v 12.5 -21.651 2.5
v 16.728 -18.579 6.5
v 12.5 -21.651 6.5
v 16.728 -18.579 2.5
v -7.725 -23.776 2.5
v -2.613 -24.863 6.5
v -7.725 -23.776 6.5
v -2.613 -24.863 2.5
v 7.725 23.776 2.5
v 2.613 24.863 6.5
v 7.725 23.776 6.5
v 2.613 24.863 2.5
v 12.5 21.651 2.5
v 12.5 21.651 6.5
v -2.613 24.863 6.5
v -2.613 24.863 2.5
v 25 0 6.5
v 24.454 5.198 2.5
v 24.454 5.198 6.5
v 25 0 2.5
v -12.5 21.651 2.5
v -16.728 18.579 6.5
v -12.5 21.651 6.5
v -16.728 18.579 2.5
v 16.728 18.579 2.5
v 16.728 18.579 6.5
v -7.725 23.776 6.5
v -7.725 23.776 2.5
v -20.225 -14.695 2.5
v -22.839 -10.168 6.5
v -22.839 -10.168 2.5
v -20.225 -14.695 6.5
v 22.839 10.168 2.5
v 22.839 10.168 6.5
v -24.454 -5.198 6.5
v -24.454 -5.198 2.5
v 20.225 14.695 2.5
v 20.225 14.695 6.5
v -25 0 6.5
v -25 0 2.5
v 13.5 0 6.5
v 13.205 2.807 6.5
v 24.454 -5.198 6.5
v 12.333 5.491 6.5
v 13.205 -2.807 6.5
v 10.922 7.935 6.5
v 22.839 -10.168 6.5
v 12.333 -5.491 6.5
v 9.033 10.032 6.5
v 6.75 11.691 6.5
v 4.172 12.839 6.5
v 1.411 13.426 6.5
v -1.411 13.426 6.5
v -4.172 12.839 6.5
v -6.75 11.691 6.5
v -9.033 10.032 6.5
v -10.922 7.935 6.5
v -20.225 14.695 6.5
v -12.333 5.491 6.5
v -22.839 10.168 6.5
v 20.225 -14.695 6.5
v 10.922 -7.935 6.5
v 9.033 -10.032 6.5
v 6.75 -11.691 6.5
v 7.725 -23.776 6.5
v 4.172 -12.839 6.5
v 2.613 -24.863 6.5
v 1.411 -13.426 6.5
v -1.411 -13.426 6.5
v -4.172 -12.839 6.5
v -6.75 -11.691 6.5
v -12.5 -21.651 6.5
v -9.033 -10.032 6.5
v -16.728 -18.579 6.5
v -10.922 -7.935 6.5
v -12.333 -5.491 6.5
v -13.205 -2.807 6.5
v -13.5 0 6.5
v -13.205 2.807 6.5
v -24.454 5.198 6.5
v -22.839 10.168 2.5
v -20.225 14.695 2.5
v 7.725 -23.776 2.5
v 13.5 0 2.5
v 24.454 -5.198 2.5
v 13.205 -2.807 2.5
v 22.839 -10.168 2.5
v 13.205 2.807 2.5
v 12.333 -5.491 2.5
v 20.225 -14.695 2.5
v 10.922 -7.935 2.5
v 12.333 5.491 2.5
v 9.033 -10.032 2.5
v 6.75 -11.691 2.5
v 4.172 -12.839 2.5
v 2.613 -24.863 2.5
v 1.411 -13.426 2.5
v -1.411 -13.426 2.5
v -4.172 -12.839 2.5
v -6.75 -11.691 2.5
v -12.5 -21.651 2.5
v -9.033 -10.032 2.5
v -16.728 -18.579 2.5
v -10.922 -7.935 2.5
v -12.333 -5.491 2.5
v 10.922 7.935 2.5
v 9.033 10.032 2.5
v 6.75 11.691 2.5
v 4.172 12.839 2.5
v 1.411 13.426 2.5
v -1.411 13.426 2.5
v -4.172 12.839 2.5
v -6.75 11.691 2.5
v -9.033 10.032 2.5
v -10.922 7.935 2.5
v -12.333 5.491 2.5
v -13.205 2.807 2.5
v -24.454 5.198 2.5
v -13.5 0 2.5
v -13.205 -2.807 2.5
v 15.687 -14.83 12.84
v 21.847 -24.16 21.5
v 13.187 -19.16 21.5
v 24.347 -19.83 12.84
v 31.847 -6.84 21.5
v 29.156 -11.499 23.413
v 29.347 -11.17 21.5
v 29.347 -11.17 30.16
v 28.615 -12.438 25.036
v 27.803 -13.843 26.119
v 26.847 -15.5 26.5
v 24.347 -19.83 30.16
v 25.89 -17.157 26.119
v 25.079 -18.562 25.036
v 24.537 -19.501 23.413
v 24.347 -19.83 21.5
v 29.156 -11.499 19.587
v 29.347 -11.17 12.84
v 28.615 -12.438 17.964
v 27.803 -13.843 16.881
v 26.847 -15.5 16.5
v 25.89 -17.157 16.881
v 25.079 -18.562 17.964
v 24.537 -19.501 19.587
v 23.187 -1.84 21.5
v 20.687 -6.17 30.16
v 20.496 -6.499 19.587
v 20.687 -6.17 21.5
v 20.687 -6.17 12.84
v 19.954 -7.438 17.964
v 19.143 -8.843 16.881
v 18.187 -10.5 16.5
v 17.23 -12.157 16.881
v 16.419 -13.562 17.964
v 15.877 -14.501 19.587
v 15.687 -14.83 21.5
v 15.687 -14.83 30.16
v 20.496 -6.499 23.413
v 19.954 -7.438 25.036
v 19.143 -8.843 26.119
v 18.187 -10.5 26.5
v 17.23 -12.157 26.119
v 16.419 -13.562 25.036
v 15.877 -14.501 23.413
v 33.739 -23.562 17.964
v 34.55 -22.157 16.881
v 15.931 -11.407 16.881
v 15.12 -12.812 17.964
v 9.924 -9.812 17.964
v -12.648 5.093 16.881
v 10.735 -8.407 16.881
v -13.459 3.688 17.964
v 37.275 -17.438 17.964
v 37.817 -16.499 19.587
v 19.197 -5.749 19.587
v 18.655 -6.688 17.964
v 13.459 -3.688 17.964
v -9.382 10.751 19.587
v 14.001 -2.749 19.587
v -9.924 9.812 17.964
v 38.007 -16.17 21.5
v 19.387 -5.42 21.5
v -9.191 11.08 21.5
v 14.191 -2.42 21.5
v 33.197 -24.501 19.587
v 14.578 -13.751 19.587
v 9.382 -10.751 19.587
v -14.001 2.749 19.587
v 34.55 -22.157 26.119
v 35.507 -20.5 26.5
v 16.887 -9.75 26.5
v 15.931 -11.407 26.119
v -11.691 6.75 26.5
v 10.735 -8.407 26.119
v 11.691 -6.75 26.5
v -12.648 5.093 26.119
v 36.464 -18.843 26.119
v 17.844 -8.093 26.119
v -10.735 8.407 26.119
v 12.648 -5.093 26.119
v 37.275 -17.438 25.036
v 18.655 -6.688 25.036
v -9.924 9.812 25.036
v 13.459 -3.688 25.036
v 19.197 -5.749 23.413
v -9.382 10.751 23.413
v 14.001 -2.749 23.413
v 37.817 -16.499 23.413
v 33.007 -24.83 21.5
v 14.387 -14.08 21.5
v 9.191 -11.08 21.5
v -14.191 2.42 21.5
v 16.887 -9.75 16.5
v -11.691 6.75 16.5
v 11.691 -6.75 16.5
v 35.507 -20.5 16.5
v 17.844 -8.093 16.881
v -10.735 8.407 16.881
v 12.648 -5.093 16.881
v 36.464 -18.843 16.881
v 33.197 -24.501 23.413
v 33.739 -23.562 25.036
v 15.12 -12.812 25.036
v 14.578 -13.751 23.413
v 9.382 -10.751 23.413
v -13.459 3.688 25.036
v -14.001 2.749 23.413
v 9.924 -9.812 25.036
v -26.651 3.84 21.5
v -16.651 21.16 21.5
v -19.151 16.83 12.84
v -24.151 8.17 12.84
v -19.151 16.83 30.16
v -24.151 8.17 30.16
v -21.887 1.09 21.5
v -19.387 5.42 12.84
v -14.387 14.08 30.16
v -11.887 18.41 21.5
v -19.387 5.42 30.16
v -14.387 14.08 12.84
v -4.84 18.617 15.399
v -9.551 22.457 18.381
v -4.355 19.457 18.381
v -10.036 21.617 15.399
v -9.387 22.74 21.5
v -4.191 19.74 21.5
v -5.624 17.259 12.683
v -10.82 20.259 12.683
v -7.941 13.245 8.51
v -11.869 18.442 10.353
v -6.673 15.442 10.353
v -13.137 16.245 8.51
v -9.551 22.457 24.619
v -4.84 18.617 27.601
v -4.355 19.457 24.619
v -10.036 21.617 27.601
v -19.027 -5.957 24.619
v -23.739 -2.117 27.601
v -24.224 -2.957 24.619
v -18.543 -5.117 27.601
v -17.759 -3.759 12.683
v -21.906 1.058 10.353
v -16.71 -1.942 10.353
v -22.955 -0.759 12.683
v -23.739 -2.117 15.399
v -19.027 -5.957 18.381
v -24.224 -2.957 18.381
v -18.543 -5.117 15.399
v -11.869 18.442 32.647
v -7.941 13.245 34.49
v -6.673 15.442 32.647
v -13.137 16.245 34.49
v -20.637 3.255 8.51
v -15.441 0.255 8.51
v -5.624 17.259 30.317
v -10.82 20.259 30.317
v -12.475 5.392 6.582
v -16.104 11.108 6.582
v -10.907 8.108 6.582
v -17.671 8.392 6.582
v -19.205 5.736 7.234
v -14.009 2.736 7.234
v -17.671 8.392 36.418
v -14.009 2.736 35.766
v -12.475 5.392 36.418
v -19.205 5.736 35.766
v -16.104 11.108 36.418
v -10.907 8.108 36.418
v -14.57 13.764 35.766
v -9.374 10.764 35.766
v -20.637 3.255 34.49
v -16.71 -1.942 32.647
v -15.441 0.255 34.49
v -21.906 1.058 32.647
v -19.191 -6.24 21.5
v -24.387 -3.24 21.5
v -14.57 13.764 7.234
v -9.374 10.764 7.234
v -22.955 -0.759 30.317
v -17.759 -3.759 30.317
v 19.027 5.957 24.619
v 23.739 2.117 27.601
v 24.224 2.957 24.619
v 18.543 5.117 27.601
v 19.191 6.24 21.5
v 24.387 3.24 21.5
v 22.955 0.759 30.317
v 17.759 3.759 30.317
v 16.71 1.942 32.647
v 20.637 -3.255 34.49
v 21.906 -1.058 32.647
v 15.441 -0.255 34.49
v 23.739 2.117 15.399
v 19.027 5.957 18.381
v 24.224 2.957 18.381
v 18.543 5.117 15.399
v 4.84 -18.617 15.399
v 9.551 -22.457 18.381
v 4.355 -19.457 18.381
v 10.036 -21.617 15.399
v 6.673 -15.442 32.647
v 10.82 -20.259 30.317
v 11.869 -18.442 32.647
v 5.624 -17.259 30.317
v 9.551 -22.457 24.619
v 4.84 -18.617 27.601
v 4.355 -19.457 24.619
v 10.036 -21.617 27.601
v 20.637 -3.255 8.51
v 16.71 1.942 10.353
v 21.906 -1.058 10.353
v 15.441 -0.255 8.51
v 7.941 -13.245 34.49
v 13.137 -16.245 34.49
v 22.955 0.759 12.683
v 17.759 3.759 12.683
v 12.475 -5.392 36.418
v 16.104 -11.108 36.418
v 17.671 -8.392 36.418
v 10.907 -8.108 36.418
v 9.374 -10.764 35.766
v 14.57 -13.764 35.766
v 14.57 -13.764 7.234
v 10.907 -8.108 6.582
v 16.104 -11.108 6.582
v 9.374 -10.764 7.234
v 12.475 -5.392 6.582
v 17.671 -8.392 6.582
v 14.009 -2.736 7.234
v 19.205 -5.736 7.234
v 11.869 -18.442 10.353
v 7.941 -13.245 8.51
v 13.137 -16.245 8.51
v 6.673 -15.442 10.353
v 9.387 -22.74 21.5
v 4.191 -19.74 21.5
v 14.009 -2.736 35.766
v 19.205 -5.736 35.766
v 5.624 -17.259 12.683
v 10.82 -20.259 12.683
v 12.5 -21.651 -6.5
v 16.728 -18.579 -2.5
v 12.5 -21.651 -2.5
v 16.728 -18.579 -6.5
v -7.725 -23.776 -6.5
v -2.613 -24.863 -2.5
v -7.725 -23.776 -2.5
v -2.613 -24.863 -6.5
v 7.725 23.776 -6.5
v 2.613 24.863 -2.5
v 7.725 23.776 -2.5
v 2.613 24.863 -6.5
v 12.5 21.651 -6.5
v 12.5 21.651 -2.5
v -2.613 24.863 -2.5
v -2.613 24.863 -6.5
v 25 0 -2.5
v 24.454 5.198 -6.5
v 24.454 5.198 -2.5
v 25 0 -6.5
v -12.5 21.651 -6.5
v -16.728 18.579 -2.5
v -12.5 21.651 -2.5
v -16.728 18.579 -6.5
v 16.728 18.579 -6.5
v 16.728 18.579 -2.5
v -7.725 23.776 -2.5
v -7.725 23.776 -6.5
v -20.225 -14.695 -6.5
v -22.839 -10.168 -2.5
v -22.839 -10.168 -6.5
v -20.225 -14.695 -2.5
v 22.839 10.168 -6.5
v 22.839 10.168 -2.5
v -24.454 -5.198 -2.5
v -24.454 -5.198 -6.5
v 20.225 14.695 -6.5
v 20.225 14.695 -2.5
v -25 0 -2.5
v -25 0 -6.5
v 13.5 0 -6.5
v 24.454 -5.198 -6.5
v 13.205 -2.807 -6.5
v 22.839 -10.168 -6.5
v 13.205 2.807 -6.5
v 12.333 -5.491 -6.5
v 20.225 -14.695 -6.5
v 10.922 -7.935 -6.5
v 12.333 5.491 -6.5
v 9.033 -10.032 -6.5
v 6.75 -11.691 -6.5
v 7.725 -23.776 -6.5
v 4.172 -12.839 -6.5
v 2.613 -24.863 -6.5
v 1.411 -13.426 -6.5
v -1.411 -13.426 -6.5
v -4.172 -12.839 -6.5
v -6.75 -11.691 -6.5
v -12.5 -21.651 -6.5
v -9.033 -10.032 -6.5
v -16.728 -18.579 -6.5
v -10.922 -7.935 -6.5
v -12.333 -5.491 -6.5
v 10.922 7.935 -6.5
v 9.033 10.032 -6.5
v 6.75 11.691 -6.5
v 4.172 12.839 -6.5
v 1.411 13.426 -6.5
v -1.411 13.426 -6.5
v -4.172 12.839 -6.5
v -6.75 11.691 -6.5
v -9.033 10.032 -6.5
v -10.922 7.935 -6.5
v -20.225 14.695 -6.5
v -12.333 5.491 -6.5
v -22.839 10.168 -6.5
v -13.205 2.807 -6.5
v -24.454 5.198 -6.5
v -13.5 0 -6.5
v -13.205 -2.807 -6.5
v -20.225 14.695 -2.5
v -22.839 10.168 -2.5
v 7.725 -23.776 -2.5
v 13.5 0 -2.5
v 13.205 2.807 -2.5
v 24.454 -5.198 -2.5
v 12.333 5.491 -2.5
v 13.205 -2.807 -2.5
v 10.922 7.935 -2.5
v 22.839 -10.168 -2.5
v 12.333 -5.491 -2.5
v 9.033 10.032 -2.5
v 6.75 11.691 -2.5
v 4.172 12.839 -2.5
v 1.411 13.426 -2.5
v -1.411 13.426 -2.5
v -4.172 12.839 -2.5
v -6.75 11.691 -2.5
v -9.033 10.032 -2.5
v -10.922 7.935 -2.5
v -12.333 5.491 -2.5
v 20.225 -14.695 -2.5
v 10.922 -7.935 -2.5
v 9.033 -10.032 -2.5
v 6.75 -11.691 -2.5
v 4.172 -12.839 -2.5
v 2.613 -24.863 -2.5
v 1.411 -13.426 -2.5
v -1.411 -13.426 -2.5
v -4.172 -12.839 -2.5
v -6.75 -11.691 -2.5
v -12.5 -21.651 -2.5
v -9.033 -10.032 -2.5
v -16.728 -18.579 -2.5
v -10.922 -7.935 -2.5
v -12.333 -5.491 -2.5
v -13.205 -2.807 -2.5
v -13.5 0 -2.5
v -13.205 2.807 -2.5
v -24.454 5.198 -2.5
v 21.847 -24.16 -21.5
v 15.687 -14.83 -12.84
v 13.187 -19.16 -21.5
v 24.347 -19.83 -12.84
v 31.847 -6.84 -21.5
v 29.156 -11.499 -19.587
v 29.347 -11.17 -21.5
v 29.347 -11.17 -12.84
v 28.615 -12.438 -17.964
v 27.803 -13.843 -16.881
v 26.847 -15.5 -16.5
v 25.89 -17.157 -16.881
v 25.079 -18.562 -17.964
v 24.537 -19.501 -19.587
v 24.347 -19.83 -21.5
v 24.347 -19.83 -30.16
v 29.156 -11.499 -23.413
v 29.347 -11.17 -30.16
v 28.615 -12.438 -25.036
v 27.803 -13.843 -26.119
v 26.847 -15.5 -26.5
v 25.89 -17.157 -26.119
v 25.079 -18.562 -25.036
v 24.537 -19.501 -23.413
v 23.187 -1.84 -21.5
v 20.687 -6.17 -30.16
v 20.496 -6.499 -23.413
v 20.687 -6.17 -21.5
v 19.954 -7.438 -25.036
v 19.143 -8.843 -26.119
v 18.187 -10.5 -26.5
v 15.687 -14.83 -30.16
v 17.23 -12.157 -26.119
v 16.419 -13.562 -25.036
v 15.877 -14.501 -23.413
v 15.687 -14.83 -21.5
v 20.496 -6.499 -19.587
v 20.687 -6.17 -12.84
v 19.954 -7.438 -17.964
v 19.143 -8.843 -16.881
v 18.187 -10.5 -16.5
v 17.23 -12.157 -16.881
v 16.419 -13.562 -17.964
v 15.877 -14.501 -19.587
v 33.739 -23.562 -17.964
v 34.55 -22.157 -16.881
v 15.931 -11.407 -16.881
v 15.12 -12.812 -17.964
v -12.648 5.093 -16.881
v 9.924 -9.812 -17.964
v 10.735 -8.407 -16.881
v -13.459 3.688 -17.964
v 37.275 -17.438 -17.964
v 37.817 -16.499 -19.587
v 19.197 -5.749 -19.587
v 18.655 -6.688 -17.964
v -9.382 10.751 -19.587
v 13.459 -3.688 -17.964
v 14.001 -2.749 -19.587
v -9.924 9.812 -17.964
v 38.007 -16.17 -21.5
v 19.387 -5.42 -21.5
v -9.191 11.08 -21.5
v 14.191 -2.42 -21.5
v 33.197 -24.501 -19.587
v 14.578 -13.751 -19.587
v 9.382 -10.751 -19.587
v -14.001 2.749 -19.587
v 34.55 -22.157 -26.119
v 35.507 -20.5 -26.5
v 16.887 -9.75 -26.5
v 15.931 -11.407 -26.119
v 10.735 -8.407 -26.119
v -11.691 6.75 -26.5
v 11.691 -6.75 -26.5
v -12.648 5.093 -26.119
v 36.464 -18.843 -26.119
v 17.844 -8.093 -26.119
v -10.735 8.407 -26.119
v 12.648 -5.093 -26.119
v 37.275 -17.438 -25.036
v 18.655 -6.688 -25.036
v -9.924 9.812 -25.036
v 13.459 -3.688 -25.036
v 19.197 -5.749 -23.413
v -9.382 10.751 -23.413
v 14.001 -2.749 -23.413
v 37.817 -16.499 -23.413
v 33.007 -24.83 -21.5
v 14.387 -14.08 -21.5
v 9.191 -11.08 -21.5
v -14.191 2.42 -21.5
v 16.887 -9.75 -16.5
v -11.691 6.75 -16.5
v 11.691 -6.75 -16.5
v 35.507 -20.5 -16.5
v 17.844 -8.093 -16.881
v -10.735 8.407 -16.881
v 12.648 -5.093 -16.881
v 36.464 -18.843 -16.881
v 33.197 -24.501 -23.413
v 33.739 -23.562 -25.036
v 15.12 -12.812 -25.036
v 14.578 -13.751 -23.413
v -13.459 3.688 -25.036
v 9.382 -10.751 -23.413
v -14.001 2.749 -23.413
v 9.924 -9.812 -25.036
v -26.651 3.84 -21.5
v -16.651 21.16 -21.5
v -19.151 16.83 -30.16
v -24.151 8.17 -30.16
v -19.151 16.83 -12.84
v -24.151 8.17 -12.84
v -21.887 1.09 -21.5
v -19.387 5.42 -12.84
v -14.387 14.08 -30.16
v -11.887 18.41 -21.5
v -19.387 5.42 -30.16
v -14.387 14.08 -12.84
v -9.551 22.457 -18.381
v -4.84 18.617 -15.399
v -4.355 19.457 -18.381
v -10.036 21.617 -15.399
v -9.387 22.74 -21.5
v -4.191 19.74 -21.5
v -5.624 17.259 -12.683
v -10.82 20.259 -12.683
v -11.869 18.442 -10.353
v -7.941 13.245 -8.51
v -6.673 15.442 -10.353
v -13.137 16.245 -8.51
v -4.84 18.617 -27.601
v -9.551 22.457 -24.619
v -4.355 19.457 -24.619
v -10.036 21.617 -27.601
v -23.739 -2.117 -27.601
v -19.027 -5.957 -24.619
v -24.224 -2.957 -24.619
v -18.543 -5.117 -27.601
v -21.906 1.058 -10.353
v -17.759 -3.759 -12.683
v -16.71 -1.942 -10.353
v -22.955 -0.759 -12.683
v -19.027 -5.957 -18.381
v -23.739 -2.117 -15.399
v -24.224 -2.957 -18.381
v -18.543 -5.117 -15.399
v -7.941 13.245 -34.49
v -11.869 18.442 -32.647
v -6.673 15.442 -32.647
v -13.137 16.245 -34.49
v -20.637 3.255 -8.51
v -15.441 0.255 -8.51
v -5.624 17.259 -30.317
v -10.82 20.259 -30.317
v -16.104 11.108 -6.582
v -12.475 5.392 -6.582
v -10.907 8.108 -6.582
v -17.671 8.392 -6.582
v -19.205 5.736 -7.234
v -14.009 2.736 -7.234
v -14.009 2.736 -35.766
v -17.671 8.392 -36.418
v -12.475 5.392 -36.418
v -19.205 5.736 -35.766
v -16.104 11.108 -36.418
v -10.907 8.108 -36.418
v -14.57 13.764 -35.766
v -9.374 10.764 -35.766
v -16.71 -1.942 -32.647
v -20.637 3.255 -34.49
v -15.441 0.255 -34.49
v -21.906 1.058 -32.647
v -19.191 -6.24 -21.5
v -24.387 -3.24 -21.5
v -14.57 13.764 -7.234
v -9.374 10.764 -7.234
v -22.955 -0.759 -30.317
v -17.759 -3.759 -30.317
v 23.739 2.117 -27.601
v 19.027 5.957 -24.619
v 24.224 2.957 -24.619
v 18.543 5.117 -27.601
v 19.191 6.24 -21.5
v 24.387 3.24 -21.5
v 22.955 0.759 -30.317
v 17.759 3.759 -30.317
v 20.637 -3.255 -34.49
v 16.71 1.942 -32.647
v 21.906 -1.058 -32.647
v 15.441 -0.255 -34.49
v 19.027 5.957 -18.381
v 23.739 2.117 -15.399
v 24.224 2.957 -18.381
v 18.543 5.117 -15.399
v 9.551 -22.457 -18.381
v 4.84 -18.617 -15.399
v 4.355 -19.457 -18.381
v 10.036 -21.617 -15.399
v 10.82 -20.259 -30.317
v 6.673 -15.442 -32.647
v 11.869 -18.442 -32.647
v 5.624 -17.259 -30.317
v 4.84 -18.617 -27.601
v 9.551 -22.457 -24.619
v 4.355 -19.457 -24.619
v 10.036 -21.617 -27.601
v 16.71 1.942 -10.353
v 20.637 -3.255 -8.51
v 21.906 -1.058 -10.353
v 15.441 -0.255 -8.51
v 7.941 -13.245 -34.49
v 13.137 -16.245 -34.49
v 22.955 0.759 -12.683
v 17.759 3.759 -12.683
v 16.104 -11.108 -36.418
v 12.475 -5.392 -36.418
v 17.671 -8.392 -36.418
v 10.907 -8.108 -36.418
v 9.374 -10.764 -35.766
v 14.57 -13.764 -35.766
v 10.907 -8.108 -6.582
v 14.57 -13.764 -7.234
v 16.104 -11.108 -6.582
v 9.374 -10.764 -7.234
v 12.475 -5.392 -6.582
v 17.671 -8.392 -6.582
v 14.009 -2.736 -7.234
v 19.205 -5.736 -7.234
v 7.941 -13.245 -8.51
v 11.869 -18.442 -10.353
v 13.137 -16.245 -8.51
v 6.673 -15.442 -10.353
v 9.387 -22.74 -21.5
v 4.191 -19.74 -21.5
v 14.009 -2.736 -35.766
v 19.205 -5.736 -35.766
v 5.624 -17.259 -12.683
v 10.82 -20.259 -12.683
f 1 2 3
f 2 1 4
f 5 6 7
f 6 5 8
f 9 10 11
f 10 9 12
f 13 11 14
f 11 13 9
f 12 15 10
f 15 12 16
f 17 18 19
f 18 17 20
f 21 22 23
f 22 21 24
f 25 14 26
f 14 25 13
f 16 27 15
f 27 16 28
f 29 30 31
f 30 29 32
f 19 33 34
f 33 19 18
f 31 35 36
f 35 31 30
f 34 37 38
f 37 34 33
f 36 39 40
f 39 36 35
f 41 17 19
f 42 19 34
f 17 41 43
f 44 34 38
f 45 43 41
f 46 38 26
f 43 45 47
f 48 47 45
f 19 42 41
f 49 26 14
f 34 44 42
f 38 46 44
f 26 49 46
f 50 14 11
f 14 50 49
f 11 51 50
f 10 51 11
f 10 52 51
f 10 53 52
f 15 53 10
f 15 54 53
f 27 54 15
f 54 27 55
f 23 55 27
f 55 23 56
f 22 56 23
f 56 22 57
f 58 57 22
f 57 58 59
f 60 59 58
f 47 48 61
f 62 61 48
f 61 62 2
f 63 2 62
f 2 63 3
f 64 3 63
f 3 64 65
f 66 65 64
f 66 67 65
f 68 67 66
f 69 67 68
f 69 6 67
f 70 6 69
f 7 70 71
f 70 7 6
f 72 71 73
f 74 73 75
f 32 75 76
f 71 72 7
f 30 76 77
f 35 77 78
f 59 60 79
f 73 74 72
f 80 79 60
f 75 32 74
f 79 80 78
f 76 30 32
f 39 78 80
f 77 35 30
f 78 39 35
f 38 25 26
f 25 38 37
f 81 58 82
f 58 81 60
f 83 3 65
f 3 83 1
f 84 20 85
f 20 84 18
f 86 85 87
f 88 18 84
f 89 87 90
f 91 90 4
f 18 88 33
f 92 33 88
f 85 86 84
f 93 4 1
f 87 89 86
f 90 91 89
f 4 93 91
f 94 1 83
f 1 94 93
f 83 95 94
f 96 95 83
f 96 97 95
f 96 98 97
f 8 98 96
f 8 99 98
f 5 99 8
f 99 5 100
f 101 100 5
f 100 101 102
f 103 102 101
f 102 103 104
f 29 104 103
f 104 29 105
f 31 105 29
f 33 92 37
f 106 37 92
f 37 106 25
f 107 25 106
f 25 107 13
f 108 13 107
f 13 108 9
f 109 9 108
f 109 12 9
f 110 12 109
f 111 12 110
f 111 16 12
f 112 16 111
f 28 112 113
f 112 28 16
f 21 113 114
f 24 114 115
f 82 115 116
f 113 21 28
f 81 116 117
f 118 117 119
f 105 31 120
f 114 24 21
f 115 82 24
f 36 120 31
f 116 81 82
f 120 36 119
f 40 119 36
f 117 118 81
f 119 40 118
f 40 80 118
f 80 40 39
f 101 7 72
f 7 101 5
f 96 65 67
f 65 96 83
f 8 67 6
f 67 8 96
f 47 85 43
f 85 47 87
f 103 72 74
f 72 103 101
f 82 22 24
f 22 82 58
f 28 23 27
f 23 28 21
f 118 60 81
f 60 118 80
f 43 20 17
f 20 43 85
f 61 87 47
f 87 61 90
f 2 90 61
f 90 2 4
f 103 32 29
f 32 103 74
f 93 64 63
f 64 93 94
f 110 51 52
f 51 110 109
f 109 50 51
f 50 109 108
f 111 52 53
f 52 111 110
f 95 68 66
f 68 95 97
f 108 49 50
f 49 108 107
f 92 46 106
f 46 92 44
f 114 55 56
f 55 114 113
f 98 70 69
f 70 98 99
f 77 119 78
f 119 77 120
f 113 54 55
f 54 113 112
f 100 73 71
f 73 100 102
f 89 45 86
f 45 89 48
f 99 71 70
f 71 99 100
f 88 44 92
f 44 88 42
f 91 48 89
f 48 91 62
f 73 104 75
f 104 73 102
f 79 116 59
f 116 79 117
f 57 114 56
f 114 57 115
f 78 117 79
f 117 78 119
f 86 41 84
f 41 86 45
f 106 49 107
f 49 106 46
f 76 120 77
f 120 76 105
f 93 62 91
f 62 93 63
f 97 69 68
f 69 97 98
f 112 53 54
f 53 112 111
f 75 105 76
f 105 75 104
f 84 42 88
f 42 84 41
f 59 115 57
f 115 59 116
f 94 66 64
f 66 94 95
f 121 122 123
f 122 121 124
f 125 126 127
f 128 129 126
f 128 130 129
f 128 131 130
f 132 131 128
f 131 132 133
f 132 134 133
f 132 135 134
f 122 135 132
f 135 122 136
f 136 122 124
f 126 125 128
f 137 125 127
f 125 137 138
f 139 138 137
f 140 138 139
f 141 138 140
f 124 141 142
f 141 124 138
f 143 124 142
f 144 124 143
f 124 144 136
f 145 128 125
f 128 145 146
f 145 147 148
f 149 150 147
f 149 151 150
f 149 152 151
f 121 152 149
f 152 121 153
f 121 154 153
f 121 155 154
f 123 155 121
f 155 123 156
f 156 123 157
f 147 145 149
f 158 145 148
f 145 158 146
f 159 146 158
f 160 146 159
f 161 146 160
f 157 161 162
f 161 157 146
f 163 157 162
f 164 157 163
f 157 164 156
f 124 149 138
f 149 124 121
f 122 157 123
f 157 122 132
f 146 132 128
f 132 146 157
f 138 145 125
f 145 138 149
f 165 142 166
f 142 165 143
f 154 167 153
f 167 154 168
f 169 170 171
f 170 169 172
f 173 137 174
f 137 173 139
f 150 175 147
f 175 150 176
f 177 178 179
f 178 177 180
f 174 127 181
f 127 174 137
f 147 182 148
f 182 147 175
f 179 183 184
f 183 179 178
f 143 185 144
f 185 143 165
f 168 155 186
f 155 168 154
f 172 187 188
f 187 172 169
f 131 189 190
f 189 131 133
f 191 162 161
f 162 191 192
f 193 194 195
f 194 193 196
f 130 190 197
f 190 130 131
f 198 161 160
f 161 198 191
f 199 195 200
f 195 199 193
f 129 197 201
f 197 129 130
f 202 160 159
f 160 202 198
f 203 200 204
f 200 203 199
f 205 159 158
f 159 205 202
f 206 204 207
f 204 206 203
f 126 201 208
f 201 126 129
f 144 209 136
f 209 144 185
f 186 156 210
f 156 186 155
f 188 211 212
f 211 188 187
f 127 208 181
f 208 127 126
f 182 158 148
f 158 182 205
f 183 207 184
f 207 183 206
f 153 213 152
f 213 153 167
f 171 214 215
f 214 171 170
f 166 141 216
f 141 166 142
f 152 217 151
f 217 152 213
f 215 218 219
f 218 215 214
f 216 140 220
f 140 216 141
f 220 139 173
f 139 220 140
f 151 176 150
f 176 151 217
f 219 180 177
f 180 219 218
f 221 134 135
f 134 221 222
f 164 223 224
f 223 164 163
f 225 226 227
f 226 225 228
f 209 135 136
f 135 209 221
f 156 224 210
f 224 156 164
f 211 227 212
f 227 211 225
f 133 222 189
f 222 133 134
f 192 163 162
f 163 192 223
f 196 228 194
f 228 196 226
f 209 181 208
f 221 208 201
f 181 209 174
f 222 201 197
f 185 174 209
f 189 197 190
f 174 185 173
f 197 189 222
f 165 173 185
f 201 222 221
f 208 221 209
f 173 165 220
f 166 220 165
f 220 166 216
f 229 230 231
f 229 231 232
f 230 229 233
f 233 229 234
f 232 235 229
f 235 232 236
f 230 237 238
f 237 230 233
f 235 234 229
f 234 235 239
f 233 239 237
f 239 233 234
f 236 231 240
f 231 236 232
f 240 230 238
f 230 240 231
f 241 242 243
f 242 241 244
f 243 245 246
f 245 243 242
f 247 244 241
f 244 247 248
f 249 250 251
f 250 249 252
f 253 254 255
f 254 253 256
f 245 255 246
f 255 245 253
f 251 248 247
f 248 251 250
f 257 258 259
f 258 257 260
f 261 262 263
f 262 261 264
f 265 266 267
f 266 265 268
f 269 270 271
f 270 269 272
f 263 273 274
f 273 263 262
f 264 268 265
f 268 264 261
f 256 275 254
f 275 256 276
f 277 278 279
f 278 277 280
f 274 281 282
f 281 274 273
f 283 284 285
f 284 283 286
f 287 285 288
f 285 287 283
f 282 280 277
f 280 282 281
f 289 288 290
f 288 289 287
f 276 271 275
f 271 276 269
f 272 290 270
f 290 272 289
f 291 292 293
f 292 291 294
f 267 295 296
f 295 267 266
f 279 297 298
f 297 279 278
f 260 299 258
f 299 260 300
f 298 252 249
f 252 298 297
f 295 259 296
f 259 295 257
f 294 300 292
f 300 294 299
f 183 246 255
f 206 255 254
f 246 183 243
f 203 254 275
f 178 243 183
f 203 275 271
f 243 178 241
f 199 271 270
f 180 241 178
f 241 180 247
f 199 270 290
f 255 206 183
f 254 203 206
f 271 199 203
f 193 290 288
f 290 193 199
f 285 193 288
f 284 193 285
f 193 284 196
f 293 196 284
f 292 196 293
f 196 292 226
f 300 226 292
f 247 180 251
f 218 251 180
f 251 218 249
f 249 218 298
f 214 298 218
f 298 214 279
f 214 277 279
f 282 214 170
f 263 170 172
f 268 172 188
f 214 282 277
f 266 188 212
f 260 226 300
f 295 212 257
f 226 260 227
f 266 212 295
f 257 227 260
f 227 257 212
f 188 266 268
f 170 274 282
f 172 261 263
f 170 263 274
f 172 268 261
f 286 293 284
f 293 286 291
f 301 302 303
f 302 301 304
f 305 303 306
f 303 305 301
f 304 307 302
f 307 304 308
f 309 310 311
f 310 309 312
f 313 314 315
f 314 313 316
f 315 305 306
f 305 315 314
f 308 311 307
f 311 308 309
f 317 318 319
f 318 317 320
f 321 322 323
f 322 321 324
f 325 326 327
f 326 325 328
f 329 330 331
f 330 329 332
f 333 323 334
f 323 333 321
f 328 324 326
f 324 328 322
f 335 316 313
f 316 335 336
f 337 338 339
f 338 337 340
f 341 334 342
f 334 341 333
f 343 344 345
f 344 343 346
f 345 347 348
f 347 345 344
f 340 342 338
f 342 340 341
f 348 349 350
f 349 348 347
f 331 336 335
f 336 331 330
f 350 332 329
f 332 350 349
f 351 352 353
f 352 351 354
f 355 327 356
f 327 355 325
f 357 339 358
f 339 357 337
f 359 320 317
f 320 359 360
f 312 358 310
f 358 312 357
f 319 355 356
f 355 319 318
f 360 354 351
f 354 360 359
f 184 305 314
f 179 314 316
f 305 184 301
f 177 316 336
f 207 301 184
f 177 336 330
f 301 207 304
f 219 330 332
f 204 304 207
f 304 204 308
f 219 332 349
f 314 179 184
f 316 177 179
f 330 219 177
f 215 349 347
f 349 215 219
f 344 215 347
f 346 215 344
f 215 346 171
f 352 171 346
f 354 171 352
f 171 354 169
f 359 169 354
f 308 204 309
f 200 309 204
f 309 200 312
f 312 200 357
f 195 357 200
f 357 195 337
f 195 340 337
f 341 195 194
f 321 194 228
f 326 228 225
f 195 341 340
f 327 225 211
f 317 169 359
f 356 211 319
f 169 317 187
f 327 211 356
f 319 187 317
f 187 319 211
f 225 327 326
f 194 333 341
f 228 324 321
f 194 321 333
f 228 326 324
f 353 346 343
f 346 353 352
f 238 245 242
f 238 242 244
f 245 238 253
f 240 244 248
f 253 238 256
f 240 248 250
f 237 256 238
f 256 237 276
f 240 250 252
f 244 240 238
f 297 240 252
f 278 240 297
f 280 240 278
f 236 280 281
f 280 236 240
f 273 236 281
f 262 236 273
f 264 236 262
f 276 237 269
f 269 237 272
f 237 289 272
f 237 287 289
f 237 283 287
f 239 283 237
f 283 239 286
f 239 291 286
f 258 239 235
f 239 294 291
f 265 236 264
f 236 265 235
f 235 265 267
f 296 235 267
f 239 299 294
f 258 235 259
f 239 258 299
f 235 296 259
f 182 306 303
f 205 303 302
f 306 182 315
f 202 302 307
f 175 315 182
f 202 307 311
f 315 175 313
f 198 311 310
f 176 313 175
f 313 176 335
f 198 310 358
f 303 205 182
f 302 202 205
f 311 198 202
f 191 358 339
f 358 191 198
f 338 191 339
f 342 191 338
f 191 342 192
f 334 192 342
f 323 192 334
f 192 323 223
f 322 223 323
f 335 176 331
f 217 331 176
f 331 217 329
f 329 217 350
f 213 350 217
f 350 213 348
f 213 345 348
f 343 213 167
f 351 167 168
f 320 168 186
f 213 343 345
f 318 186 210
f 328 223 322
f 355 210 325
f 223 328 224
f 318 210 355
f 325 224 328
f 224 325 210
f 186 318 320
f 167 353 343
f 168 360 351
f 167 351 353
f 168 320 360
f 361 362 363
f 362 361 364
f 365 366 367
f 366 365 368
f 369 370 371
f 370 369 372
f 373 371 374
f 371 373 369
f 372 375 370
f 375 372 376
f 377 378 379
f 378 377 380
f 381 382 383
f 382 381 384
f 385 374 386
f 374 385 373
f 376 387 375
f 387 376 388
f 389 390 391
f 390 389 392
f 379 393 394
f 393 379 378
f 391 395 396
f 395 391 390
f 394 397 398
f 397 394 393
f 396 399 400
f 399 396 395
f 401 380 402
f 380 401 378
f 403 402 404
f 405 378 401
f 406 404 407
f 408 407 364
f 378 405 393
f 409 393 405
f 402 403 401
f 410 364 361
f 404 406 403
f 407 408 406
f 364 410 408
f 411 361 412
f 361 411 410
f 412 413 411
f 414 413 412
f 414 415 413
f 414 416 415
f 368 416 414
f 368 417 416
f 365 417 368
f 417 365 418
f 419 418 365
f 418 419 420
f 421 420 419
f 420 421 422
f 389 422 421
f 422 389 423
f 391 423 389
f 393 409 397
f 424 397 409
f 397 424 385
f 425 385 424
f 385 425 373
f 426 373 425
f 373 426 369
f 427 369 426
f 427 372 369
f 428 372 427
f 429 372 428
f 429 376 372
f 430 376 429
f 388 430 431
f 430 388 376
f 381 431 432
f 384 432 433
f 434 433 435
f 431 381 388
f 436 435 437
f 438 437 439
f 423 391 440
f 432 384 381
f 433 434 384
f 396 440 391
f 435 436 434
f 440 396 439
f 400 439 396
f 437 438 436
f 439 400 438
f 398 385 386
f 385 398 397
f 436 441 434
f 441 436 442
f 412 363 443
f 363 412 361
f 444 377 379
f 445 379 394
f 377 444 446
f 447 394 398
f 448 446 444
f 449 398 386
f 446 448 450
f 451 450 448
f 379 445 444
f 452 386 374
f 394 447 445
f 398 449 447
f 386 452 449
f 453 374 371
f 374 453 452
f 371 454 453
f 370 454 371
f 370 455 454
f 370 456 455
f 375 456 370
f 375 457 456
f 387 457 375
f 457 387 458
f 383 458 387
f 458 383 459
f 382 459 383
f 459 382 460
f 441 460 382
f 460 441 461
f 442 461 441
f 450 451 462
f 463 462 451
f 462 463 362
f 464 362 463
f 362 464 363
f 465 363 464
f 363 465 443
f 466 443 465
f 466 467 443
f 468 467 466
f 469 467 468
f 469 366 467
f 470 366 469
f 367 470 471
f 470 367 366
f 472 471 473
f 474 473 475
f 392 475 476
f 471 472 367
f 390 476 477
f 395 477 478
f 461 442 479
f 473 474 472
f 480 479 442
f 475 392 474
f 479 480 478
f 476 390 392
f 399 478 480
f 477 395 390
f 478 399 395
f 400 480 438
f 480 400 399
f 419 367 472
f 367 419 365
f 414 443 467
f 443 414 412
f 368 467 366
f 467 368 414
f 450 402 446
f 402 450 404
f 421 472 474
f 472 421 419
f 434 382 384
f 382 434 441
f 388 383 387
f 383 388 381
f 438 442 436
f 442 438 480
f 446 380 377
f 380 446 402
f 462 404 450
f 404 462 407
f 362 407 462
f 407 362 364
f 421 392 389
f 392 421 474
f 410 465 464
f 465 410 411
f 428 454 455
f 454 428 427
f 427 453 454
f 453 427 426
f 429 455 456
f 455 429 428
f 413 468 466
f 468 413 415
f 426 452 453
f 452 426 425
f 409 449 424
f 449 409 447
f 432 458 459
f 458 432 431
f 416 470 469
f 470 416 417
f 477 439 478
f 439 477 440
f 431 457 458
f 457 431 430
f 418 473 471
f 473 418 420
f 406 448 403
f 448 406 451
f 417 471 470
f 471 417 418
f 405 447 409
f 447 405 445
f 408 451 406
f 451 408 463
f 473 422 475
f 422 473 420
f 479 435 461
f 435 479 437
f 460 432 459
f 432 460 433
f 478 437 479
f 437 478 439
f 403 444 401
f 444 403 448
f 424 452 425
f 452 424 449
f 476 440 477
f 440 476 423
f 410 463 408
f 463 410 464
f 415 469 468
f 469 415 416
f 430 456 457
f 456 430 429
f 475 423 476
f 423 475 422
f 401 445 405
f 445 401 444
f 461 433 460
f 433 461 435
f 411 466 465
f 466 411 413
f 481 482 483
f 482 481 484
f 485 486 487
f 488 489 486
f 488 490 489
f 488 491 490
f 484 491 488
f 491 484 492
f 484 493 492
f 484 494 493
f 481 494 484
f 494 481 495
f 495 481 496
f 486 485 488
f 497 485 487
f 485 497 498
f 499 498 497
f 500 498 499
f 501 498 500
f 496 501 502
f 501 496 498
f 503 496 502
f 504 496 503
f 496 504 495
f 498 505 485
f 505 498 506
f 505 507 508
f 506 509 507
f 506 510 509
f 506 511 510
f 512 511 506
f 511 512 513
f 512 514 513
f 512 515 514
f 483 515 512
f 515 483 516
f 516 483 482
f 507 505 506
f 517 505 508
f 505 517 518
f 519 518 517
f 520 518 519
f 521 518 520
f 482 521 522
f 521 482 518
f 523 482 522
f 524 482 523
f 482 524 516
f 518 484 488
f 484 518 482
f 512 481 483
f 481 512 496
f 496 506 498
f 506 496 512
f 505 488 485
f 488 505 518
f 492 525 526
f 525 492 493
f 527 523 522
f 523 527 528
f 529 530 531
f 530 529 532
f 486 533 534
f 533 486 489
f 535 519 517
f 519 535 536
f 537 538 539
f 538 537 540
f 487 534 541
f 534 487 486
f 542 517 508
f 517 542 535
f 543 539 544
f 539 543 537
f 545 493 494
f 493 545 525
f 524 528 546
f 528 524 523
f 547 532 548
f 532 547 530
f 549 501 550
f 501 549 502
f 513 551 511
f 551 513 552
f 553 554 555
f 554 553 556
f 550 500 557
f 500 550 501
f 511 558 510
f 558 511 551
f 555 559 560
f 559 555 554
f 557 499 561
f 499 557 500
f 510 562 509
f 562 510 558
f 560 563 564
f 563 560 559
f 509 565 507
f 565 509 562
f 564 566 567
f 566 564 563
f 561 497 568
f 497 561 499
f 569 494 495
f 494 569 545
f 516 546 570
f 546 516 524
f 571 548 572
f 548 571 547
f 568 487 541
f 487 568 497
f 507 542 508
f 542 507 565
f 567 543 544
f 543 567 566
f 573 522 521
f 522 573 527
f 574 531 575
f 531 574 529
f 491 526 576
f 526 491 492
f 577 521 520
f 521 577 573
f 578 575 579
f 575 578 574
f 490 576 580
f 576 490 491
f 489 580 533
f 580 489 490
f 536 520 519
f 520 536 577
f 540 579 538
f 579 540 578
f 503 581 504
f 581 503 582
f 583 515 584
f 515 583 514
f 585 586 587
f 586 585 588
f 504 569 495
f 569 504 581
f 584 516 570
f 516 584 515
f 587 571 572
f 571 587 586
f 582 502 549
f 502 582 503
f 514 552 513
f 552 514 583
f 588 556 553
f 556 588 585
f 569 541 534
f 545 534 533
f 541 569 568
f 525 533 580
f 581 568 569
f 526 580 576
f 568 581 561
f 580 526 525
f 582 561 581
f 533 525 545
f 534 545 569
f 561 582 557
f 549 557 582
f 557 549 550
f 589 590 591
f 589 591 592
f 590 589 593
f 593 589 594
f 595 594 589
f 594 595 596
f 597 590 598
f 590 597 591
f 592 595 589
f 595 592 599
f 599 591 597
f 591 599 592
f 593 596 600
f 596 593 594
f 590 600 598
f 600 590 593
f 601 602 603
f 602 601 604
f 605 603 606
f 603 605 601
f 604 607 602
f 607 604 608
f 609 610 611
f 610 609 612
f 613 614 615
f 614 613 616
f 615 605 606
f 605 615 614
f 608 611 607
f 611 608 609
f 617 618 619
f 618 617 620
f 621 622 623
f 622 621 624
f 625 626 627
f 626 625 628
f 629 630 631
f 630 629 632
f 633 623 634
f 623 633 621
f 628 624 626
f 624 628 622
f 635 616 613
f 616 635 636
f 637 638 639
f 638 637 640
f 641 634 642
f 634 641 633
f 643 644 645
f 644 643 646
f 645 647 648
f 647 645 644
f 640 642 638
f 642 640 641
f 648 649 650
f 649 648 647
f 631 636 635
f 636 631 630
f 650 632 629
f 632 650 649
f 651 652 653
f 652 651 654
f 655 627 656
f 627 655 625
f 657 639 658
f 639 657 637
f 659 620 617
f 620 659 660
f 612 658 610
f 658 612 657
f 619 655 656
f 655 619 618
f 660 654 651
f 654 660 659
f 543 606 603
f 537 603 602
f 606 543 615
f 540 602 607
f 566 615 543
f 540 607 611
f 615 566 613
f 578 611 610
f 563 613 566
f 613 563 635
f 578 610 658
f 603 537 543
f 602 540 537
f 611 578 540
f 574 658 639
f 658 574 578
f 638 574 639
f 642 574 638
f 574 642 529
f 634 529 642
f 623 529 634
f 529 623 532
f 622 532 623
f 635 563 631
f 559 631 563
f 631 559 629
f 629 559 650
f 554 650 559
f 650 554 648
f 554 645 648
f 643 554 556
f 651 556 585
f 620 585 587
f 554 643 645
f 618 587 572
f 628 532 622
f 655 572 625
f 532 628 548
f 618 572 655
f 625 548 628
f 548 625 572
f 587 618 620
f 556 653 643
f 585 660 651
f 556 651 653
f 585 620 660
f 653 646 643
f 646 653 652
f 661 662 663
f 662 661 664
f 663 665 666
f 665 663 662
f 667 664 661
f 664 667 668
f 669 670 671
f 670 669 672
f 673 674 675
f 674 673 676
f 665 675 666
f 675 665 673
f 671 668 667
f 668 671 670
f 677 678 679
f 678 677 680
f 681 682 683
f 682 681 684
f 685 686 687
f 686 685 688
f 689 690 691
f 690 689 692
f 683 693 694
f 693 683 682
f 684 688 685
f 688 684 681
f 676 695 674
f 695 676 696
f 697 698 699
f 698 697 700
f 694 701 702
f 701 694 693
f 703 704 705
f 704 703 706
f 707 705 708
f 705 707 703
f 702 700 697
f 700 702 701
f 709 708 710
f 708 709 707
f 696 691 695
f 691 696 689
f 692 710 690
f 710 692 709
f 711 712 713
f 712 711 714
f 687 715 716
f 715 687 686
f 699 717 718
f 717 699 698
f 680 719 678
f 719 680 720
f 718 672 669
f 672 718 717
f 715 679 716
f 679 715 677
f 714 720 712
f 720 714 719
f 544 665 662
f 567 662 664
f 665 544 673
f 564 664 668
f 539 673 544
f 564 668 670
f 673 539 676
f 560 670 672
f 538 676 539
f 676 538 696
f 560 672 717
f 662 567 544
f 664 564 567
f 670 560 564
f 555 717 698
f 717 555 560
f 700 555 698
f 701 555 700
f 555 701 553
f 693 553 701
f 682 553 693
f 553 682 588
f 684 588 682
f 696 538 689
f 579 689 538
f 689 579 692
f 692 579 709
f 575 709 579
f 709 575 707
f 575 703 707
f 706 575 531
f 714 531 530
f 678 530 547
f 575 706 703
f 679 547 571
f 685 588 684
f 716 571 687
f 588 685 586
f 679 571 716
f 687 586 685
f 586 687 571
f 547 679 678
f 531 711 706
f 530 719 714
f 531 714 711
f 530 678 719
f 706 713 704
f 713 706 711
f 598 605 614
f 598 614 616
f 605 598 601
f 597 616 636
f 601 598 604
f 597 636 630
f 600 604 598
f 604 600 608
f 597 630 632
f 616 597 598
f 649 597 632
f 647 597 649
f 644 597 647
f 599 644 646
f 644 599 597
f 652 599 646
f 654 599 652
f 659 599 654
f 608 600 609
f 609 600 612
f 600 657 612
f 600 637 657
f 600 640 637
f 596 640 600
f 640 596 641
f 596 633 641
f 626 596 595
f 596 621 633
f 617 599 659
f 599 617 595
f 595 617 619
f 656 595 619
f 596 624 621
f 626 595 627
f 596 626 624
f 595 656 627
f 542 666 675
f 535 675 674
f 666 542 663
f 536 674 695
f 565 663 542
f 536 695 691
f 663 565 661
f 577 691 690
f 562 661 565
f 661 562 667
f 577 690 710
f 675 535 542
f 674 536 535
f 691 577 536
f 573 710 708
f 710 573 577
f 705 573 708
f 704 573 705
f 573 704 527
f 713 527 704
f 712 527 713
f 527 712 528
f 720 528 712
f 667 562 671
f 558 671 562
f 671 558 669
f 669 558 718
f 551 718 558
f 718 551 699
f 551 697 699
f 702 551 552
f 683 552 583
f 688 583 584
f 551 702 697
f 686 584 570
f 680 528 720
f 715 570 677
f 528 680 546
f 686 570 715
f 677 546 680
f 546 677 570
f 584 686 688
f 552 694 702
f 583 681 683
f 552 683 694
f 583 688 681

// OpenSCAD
// file: ../common/metric_nut.scad
// include <../../config.scad>;
use <./beam_hexagonal.scad>;
use <./metric_bolt_functions.scad>;

module metric_nut(size, centre = true) {
    height = get_metric_bolt_head_height(size);
    diameter = get_metric_bolt_head_diameter(size);
    radius = diameter / 2;
    color("gray") difference() {
        // body
        beam_hexagonal(height, diameter, centre = centre, suppress_shopping_outputs = true);
        // hole
        cylinder(height, size / 2, size / 2, center = centre);
    }
    // Shopping
    echo(str("Nut: Nut M", size, " - x1"));
}

// $fn = 200;
metric_nut(12);
// file: ../common/beam_hexagonal.scad
// include <../../config.scad>;

module beam_hexagonal(L, d, centre = true, suppress_shopping_outputs = false) {
    radius = d / 2;
    linear_extrude(L, center = centre) polygon([[radius, 0], [radius * cos(60), radius * sin(60)], [radius * cos(120), radius * sin(120)], [radius * cos(180), radius * sin(180)], [radius * cos(240), radius * sin(240)], [radius * cos(300), radius * sin(300)]]);
    // Shopping
    if (!suppress_shopping_outputs) {
        echo(str("Hexagonal beam: Hexagonal beam Φ", d, "mm x ", L, "mm - x1"));
    }
}

// $fn = 200;
beam_hexagonal(500, 50);
// file: ../fixings/tube_clamp_square_base_plate_132_functions.scad
function get_L_shaft_with_base_plate_square_base_plate_132(beam_width) = 
    // (beam_width == 40) ?
    75
;
function get_R_plate_square_base_plate_132(beam_width) = 
    // (beam_width == 40) ?
    [143, 75, 18.5]
;
function get_thickness_square_base_plate_132(beam_width) = 
    // (beam_width == 40) ?
    8
;
function get_offset_hole_x_square_base_plate_132(beam_width) = 
    // (beam_width == 40) ?
    100 / 2
;
function get_diameter_hole_square_base_plate_132(beam_width) = 
    // (beam_width == 40) ?
    10
;
// file: ../fixings/tube_clamp_round_base_plate_132_functions.scad
function get_L_shaft_with_base_plate_round_base_plate_132(tube_diameter) = 
    (tube_diameter == 27) ? 
        85
    : (tube_diameter == 42) ?
        122
    : 25
;
function get_R_plate_round_base_plate_132(tube_diameter) = 
    (tube_diameter == 27) ? 
        [64, 114, 7]
    : (tube_diameter == 42) ?
        [80, 140, 10]
    : [10, 20, 1]
;
function get_offset_hole_y_round_base_plate_132(tube_diameter) = 
    (tube_diameter == 27) ? 
        38
    : (tube_diameter == 42) ?
        50
    : 10
;
function get_diameter_hole_round_base_plate_132(tube_diameter) = 10;
// file: ../fixings/tube_clamp_round_3_way_through_116_functions.scad
function  get_L_shaft_long_round_3_way_through_116(tube_diameter) = 
    (tube_diameter == 27) ? 
        42
    : (tube_diameter == 42) ?
        60
    : 25
;
function get_thickness_round_3_way_through_116(tube_diameter) = 7;
function get_L_shaft_short_round_3_way_through_116(tube_diameter) = tube_diameter + 2 * get_thickness_round_3_way_through_116();
// file: ../fixings/tube_clamp_round_tee_long_104_functions.scad
// include <../../config.scad>;

function get_L_shaft_long_round_tee_long_104(tube_diameter) = 
    (tube_diameter == 27) ? 
        85
    : (tube_diameter == 42) ?
        122
    : 25
;
function get_L_shaft_short_round_tee_long_104(tube_diameter) = 
    (tube_diameter == 27) ? 
        42
    : (tube_diameter == 42) ?
        61
    : 10
;
// file: brake_assembly_functions.scad
// include <../../config.scad>; // circular reference!

function get_y_pos_lead_fixing_ballscrew_to_brake_arms(angle_brake_rod, y_pos_axle_rear, x_pos_axle_leg_rear, x_offset_fixing_brake_arm_to_lead_plate) = y_pos_axle_rear + (x_pos_axle_leg_rear - x_offset_fixing_brake_arm_to_lead_plate) / tan(angle_brake_rod); // (X_POS_AXLE_LEG_REAR - X_OFFSET_FIXING_BRAKE_ARM_TO_LEAD_PLATE)
// file: ../common/washer.scad
include <../../config.scad>;

module washer(t, d_outer, d_inner, centre = true) {
    r_outer = d_outer / 2;
    r_inner = d_inner / 2;
    color("silver") difference() {
        cylinder(t, r_outer, r_outer, center = centre);
        cylinder(t, r_inner, r_inner, center = centre);
    }
    // Shopping
    echo(str("Washer: Washer Φ", d_outer, "mm x ", d_inner, "mm x ", t, "mm - x1"));
}

// $fn = 200;
washer(3, 10, 40);
// file: ../common/metric_bolt_functions.scad
function get_metric_bolt_head_height(size) = size;
function get_metric_bolt_head_diameter(size) = size * 2;
function get_metric_bolt_washer_diameter_safe_working_clearance(size) = 
    (size < 20) ?
        4 * size
    :
        3 * size
;
// file: ../common/metric_bolt.scad
// include <../../config.scad>;
use <./beam_hexagonal.scad>;
use <./metric_bolt_functions.scad>;
use <./metric_nut.scad>;

module metric_bolt(size, length, has_nut = true, offset_nut_from_end = 0) {
    echo("Metric bolt assembly:");
    head_height = get_metric_bolt_head_height(size);
    head_diameter = get_metric_bolt_head_diameter(size);
    head_radius = head_diameter / 2;
    color("gray") union() {
        // Stem
        cylinder(length, size / 2, size / 2, center = true);
        // Head
        translate([0, 0, length / 2 - size / 2]) beam_hexagonal(head_height, head_diameter, centre = true, suppress_shopping_outputs = true);
        if (has_nut) {
            // Nut
            translate([0, 0, -(length / 2 - size / 2) + offset_nut_from_end]) metric_nut(size);
        }
    }
    // Shopping
    echo(str("Bolt: Bolt M", size, " x ", length, "mm - x1"));
}

// $fn = 200;
metric_bolt(12, 100);
translate([30, 0, 0]) metric_bolt(12, 100, false);
translate([60, 0, 0]) metric_bolt(12, 100, true, 5);
// main file
include <../../config.scad>;
use <../common/metric_bolt.scad>;
use <../common/metric_bolt_functions.scad>;
use <../common/washer.scad>;


module fixing_brake_arm_to_rear_axle_leg() {
    echo("Fixing brake arm to rear axle leg:");
    count_washers_each_end = 3;
    h_nut = get_metric_bolt_head_height(SIZE_BOLT_FIXING_BRAKE_ARM_TO_REAR_AXLE_LEG);
    L_bolt = D_AXLE_REAR + 2 * (T_WASHER_BOLT_FIXING_BRAKE_ARM_TO_REAR_AXLE_LEG * count_washers_each_end + h_nut) + L_BOLT_EXTENSION;
    rotate([0, 0, ANGLE_BRAKE_ROD_MAX]) for (index_side_z = [0 : 1 : 1]) {
        mirror([0, 0, index_side_z]) translate([0, 0, R_BRAKE_ARM[2] / 2]) {
            // axle washer
            translate([0, 0, 0]) washer(T_WASHER_AXLE_FIXING_BRAKE_ARM_TO_REAR_AXLE_LEG, D_WASHER_AXLE_FIXING_BRAKE_ARM_TO_REAR_AXLE_LEG, D_AXLE_REAR, centre = false);
            // bolt
            translate([0, -L_bolt / 2 + D_AXLE_REAR / 2 + T_WASHER_BOLT_FIXING_BRAKE_ARM_TO_REAR_AXLE_LEG + h_nut, T_WASHER_AXLE_FIXING_BRAKE_ARM_TO_REAR_AXLE_LEG + D_WASHER_BOLT_FIXING_BRAKE_ARM_TO_REAR_AXLE_LEG / 2]) rotate([-90, 0, 0]) metric_bolt(SIZE_BOLT_FIXING_BRAKE_ARM_TO_REAR_AXLE_LEG, L_bolt, true, L_BOLT_EXTENSION);
            // bolt washer
            for (index_washer = [0 : 1 : count_washers_each_end]) {
                // front
                translate([0, D_AXLE_REAR / 2 + index_washer * T_WASHER_BOLT_FIXING_BRAKE_ARM_TO_REAR_AXLE_LEG, T_WASHER_AXLE_FIXING_BRAKE_ARM_TO_REAR_AXLE_LEG + D_WASHER_BOLT_FIXING_BRAKE_ARM_TO_REAR_AXLE_LEG / 2]) rotate([-90, 0, 0]) washer(T_WASHER_BOLT_FIXING_BRAKE_ARM_TO_REAR_AXLE_LEG, D_WASHER_BOLT_FIXING_BRAKE_ARM_TO_REAR_AXLE_LEG, SIZE_BOLT_FIXING_BRAKE_ARM_TO_REAR_AXLE_LEG, centre = false);
                // rear
                translate([0, -D_AXLE_REAR / 2 - index_washer * T_WASHER_BOLT_FIXING_BRAKE_ARM_TO_REAR_AXLE_LEG, T_WASHER_AXLE_FIXING_BRAKE_ARM_TO_REAR_AXLE_LEG + D_WASHER_BOLT_FIXING_BRAKE_ARM_TO_REAR_AXLE_LEG / 2]) rotate([90, 0, 0]) washer(T_WASHER_BOLT_FIXING_BRAKE_ARM_TO_REAR_AXLE_LEG, D_WASHER_BOLT_FIXING_BRAKE_ARM_TO_REAR_AXLE_LEG, SIZE_BOLT_FIXING_BRAKE_ARM_TO_REAR_AXLE_LEG, centre = false);
            }
        }
    }
    // Shopping
    // Axle washers
    // Bolts
    // Bolt washers front
    // Bolt washers rear
}

fixing_brake_arm_to_rear_axle_leg();
